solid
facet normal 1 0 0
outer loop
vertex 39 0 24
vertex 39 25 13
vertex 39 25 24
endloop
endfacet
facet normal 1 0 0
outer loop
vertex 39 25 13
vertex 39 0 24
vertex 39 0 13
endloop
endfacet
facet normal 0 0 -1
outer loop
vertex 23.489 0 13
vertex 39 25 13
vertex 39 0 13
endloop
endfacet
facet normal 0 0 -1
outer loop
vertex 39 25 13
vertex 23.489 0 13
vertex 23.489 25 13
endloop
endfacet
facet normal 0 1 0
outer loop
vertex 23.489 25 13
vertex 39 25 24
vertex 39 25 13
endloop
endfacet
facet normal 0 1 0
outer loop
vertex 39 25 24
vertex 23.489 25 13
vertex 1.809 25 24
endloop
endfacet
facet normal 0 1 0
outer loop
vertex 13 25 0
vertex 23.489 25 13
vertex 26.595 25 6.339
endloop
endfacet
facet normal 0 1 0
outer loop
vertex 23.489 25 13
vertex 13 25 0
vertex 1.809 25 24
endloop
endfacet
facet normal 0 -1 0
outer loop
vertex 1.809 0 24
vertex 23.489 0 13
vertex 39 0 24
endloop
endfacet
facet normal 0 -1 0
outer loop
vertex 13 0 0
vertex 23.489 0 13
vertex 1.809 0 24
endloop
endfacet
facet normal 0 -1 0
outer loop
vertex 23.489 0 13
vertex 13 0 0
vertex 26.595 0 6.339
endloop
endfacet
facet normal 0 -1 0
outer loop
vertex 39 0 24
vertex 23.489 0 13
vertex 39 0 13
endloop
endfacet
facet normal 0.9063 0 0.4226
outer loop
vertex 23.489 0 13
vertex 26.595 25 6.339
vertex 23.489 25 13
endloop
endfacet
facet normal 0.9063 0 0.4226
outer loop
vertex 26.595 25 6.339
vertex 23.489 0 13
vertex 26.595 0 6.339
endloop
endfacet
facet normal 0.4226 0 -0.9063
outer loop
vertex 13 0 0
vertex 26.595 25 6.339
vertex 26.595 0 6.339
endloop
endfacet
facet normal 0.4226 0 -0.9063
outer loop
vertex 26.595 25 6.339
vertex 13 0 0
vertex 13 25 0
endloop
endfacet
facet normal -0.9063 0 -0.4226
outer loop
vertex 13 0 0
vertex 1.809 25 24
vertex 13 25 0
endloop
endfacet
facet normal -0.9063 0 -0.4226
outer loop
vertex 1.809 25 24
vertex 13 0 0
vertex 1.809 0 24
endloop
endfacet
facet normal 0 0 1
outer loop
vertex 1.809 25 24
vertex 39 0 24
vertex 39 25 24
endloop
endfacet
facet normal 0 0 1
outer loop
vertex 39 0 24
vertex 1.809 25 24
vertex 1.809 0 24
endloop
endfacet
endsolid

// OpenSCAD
Width=25;
difference()
{
    union()
    {
      translate([9,0,13]) cube([30,Width,30]);
      translate([13,0,0]) rotate([0,-25,0]) cube([15,Width,30]);
    }
    translate([0,-1,24]) cube([55,Width+5,35]);
}
